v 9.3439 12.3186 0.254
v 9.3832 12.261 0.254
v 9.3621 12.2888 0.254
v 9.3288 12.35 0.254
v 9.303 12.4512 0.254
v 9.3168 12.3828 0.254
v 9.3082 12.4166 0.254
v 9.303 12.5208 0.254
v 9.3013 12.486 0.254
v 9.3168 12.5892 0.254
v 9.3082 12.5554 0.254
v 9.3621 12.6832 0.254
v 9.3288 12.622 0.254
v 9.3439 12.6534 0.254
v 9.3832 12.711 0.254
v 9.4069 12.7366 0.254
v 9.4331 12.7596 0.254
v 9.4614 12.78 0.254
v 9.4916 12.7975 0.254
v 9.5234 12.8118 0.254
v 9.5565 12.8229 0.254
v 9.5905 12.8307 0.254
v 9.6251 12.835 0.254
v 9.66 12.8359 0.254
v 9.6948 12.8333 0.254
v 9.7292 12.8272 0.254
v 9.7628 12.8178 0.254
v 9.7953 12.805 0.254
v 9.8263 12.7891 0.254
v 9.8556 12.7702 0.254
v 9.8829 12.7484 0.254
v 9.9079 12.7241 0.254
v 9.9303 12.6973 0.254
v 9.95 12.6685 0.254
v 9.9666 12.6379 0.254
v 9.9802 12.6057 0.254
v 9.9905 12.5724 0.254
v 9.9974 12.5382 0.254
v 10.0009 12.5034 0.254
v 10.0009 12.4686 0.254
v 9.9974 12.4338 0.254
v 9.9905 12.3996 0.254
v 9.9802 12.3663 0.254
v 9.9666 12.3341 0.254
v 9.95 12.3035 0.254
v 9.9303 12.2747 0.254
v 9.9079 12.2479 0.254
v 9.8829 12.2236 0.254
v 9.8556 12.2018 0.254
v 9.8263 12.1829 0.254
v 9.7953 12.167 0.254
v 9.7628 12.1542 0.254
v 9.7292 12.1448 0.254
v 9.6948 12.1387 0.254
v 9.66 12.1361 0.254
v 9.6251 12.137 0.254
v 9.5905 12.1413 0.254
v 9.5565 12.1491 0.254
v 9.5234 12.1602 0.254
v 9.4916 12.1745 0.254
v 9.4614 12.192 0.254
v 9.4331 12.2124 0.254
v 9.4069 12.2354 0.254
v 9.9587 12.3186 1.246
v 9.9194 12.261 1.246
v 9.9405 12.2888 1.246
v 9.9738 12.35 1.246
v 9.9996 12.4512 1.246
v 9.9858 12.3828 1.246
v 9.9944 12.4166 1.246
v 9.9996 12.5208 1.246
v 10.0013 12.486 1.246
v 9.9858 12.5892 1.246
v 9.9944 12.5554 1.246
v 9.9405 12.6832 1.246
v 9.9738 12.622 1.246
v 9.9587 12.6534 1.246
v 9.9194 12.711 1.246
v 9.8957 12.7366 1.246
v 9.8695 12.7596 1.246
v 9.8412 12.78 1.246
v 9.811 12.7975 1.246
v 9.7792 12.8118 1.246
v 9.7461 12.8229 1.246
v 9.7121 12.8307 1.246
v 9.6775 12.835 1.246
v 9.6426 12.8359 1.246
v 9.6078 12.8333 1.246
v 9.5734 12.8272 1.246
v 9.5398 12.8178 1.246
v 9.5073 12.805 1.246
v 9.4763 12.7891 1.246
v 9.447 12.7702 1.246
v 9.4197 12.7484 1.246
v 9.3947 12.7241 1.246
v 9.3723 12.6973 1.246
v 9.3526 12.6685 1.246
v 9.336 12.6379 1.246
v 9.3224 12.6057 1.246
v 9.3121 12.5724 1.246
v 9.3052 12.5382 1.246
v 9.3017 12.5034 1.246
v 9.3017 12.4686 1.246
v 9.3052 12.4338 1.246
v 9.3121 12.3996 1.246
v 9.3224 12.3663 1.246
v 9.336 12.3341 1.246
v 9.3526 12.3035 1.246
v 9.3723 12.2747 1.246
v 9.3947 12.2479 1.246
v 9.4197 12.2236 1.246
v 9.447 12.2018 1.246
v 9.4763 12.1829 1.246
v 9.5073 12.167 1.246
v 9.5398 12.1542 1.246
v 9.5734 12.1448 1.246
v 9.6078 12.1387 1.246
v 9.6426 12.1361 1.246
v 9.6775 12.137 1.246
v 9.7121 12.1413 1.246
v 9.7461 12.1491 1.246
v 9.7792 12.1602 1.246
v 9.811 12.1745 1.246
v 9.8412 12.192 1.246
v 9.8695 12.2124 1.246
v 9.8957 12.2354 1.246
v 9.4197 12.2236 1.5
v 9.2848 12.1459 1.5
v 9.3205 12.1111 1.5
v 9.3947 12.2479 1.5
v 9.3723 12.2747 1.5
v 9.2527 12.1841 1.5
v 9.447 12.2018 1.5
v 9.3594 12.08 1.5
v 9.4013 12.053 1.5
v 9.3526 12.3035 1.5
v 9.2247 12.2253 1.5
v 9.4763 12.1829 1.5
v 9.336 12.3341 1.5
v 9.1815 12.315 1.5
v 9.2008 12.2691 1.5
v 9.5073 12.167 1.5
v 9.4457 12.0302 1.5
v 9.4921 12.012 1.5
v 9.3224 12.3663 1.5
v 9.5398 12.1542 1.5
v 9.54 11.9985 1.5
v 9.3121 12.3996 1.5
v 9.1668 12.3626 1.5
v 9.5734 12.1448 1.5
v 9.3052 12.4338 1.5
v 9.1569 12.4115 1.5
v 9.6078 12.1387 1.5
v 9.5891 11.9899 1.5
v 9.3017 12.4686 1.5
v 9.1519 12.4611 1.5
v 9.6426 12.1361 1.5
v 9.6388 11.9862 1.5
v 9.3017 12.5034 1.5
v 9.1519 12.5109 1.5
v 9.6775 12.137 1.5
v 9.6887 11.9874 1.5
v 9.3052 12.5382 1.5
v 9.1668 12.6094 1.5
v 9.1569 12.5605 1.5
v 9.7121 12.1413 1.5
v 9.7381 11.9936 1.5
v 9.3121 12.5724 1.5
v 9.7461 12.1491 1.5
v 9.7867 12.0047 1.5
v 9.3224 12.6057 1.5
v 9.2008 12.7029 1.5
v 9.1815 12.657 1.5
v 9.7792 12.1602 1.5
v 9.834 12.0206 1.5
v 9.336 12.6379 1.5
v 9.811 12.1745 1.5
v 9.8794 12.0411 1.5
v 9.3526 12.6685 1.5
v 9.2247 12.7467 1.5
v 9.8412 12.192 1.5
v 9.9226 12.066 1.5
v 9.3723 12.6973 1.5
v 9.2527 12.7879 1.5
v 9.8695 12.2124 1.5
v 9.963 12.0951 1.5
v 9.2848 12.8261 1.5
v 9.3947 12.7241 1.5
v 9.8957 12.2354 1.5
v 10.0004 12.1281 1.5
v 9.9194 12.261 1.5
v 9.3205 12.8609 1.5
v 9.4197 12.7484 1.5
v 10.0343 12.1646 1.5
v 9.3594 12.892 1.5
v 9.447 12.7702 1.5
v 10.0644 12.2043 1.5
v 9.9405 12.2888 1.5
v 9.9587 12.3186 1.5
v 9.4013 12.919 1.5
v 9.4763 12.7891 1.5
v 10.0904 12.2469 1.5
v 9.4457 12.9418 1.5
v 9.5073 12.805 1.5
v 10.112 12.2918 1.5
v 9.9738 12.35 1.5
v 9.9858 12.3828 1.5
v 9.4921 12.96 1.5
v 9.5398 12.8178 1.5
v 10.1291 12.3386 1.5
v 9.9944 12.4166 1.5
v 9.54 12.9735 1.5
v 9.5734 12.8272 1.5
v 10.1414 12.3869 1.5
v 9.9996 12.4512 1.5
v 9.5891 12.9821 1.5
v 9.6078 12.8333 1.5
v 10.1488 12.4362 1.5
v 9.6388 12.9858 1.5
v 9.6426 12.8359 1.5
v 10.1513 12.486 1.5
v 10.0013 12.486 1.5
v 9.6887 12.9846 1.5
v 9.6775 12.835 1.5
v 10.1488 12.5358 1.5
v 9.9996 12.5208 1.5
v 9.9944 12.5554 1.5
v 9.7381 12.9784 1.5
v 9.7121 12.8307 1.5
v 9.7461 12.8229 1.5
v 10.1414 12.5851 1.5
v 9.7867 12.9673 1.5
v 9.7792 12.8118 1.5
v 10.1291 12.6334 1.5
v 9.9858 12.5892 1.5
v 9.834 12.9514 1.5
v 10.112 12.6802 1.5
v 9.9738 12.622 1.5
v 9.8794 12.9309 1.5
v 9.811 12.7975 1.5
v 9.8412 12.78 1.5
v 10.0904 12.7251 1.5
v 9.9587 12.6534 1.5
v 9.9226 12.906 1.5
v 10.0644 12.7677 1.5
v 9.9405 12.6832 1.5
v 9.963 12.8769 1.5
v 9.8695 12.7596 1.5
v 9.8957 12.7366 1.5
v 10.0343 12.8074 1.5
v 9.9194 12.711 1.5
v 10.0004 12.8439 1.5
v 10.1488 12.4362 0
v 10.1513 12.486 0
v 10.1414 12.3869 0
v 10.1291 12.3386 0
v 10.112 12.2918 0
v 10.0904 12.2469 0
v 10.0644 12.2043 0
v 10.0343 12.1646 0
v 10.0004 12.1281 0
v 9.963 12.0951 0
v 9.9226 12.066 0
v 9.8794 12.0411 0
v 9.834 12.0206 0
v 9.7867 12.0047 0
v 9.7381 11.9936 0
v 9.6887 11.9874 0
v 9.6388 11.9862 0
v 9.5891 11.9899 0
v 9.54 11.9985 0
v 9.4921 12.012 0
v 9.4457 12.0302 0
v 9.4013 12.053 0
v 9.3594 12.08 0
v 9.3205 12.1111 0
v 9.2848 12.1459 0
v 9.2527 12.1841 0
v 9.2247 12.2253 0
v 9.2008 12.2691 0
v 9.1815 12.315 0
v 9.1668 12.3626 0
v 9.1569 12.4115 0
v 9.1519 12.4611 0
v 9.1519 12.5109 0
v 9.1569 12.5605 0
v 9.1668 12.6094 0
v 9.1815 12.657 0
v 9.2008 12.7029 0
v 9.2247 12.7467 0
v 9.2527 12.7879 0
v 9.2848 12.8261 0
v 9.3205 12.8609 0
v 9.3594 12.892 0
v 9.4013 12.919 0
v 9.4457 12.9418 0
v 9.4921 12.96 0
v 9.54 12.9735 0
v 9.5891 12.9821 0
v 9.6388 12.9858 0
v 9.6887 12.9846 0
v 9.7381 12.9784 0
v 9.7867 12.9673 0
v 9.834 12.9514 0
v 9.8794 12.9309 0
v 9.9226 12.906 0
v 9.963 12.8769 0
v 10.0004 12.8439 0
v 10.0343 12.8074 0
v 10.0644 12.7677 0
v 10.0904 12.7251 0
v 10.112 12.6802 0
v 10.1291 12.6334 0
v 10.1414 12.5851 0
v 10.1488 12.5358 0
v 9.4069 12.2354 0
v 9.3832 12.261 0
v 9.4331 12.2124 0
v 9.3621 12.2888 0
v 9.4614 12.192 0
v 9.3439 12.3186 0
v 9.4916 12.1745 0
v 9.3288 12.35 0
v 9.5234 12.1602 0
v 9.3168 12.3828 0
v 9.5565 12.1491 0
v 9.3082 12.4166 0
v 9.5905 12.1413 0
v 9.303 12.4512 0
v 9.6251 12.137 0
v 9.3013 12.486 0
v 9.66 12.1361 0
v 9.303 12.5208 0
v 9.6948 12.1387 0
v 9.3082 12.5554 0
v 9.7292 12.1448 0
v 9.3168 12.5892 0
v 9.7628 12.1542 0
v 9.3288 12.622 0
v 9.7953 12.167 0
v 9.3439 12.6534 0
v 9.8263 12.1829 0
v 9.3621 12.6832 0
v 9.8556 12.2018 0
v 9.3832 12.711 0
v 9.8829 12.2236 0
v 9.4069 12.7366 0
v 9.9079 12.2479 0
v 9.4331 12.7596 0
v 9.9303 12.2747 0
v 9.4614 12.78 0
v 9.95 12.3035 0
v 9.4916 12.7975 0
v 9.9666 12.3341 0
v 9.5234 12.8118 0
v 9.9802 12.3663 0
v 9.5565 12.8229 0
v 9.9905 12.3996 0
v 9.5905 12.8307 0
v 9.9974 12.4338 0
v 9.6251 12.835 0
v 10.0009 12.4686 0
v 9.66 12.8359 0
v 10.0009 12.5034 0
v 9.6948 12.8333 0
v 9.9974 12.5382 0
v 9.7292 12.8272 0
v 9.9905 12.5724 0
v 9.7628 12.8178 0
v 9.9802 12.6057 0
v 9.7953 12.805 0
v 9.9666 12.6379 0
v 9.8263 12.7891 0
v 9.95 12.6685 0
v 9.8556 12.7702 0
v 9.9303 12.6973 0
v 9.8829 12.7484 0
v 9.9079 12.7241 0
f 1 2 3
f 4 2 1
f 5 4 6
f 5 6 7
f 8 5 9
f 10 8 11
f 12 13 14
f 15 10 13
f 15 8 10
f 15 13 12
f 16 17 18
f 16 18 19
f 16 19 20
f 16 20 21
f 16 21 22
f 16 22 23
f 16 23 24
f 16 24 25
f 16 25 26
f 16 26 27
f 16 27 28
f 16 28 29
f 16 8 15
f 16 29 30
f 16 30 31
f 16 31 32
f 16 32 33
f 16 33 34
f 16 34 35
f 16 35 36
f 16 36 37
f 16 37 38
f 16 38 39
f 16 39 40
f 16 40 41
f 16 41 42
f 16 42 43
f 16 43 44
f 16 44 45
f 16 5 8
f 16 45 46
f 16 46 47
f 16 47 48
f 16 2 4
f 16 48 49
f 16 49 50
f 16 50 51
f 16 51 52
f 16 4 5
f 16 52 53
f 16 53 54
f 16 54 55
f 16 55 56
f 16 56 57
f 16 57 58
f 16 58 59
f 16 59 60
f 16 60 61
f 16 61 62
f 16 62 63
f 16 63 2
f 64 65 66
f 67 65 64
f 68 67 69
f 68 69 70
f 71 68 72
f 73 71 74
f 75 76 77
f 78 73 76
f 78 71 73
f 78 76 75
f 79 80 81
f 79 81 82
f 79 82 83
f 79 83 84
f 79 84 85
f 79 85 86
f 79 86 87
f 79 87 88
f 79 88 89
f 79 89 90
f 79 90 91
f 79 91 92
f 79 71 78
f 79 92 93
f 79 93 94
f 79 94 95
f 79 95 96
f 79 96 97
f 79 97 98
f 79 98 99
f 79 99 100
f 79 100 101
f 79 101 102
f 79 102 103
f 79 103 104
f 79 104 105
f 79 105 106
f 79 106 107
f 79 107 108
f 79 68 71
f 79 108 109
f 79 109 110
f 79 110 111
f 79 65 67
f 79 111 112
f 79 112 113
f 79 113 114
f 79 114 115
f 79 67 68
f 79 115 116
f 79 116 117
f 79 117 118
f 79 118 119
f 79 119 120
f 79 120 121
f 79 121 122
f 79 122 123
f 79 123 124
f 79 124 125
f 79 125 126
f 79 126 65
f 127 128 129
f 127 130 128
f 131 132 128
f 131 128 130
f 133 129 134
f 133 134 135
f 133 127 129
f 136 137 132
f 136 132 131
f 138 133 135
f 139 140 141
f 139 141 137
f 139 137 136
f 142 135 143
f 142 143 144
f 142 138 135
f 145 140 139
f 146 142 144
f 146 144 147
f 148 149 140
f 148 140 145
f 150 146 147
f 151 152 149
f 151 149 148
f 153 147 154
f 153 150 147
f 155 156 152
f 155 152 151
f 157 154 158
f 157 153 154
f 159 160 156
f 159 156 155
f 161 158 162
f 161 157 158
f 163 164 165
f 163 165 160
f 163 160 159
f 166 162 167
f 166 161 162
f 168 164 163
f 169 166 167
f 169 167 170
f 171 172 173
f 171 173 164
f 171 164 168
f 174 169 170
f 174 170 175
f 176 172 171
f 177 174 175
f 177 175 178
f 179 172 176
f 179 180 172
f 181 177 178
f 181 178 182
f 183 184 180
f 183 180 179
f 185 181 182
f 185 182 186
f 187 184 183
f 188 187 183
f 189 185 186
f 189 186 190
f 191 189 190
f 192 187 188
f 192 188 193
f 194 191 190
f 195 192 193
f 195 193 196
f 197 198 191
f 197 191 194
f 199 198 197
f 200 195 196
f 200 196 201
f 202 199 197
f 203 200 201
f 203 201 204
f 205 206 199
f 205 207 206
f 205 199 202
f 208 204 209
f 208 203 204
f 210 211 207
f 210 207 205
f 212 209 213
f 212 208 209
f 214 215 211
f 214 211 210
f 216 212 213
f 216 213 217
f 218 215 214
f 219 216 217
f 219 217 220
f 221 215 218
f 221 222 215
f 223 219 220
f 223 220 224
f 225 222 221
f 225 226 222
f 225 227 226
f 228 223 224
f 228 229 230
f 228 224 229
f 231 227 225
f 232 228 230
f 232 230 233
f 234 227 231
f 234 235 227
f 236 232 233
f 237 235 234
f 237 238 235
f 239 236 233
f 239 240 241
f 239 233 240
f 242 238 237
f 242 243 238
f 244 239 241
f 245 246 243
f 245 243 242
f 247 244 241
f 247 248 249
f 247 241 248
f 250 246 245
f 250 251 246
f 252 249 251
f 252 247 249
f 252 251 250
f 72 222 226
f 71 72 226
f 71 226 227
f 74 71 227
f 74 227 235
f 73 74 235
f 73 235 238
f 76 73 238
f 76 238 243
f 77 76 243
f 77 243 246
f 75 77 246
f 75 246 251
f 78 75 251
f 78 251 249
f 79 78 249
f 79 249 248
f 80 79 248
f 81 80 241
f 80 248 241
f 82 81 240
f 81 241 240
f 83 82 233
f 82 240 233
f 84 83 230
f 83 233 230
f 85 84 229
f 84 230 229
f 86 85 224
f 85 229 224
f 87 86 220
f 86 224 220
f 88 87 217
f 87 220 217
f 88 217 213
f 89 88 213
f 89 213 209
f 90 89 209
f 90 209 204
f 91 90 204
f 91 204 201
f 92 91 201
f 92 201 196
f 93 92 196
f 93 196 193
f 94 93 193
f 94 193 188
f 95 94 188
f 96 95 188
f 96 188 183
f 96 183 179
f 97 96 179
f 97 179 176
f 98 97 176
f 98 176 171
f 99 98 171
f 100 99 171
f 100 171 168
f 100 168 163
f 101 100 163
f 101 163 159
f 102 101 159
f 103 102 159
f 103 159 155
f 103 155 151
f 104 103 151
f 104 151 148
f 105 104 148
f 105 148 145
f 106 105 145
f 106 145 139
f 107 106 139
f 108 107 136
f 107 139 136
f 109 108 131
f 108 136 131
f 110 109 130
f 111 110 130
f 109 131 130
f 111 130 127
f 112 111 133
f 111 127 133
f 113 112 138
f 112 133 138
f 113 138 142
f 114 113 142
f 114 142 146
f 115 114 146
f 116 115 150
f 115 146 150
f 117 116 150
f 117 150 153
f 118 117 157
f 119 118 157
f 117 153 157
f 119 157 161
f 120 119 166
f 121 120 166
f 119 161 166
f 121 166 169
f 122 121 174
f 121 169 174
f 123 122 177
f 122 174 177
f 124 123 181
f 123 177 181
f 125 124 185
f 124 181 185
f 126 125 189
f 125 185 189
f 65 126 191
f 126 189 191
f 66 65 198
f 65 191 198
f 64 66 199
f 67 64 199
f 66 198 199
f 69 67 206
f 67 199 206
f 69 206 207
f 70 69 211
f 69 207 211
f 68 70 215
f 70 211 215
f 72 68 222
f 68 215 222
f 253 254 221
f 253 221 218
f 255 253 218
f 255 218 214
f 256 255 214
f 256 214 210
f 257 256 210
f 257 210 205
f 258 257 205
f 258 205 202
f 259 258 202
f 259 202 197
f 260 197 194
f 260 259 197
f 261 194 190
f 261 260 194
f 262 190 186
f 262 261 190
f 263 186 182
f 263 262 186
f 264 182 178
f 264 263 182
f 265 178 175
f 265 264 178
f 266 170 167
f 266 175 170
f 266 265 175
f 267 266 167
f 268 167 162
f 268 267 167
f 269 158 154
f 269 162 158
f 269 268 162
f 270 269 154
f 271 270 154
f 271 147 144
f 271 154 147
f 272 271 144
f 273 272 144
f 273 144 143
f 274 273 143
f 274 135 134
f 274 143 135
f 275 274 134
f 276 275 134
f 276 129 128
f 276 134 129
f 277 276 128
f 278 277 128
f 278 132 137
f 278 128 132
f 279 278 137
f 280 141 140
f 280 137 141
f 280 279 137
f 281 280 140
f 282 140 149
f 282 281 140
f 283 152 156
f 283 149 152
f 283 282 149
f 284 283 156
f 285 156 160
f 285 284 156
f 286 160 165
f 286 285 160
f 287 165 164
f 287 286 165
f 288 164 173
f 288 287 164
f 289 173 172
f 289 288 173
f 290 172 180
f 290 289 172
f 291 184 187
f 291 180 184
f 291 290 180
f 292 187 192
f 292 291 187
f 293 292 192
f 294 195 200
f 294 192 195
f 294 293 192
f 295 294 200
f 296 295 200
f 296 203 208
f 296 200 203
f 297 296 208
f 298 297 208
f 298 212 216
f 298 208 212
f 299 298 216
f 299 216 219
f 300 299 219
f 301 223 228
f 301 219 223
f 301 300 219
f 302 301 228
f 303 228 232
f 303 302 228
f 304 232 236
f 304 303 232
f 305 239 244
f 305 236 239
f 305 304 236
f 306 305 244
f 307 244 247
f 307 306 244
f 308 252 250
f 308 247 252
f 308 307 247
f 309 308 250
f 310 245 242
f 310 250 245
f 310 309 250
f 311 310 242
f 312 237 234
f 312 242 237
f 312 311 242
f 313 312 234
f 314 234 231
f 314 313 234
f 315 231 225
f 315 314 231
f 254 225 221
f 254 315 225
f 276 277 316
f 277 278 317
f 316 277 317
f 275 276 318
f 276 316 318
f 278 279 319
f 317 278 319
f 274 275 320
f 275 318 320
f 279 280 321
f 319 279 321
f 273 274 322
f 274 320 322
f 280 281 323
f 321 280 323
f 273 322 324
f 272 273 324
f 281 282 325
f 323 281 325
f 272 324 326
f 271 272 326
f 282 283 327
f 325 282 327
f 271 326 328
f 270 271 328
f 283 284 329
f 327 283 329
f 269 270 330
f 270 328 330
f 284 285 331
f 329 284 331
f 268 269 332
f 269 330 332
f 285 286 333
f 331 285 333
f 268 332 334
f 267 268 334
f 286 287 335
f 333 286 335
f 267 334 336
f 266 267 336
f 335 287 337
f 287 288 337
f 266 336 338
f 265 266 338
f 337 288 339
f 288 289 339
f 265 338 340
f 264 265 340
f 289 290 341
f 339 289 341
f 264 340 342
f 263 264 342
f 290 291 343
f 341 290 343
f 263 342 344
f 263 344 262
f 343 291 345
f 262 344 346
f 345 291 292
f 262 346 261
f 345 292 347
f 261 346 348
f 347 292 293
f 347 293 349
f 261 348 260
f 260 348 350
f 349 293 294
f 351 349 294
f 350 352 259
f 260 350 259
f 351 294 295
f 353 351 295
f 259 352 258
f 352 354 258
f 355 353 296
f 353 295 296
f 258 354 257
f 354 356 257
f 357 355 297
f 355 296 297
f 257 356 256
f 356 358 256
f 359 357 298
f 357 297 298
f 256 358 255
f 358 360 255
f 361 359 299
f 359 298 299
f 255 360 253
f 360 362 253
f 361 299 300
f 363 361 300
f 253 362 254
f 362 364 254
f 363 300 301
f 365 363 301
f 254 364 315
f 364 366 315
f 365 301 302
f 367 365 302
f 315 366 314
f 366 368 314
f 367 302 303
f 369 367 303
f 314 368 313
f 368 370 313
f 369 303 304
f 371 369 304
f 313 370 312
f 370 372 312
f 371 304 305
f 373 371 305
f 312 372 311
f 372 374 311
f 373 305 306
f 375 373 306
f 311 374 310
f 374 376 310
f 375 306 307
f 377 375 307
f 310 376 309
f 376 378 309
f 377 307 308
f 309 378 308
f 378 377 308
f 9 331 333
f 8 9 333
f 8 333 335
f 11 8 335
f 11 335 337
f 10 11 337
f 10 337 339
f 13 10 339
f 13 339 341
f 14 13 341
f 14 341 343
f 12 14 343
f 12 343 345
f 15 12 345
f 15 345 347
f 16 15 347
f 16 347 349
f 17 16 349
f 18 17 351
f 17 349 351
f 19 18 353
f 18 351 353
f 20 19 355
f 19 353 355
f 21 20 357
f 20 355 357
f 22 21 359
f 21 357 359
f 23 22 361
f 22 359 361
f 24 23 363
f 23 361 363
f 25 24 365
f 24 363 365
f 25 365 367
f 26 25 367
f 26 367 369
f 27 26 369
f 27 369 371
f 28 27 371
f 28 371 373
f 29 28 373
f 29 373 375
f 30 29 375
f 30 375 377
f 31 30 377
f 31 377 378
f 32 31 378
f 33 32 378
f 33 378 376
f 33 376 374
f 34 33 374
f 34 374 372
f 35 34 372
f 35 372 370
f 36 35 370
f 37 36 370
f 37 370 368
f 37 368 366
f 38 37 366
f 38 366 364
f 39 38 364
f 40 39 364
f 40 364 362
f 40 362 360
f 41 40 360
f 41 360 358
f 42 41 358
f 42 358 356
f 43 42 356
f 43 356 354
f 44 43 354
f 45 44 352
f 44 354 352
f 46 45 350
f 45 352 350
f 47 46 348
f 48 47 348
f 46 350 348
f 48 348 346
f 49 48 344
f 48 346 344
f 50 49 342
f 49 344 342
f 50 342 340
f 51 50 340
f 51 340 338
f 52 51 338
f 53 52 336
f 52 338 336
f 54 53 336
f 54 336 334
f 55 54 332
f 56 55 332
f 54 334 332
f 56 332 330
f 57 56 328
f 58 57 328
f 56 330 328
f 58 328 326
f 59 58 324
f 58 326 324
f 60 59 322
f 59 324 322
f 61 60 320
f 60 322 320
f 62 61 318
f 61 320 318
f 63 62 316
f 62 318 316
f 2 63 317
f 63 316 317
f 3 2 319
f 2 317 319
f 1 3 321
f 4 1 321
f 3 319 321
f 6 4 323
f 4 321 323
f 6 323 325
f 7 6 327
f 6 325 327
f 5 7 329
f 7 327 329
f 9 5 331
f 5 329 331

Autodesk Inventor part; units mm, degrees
ref_plane "YZ Plane" through (0, 0, 0) normal (1, 0, 0) x (0, 1, 0)
ref_plane "XZ Plane" through (0, 0, 0) normal (0, 1, 0) x (-1, 0, 0)
ref_plane "XY Plane" through (0, 0, 0) normal (0, 0, 1) x (1, 0, 0)
sketch "Sketch1" plane through (0, 0, 0) normal (0, 0, 1) x (1, 0, 0)
  circle A0 centre (9.6513, 12.486) radius 1.25 projected
  circle A1 centre (9.6513, 12.486) radius 0.5
  point P0 (0, 0)
  dimension "d0" = 1
extrude "Extrusion1" add sketch "Sketch1" along normal blind 1.5 contours A1
sketch "Sketch2" plane through (9.6513, 12.486, 1.5) normal (0, 0, 1) x (1, 0, 0)
  circle A0 centre (0, 0) radius 0.35
  point P0 (-9.6513, -12.486)
  dimension "d3" = 0.7
extrude "Extrusion2" cut sketch "Sketch2" against normal blind 0.254
sketch "Sketch3" plane through (9.6513, 12.486, 0) normal (0, 0, -1) x (-1, 0, 0)
  circle A0 centre (0, 0) radius 0.35
  point P0 (9.6513, -12.486)
  dimension "d6" = 0.7
extrude "Extrusion3" cut sketch "Sketch3" against normal blind 0.254
sketch "Sketch4" plane through (9.6513, 12.486, 0.254) normal (0, 0, -1) x (-1, 0, 0)
  circle A0 centre (0, 0) radius 0.35 projected
properties part number "terminal"
